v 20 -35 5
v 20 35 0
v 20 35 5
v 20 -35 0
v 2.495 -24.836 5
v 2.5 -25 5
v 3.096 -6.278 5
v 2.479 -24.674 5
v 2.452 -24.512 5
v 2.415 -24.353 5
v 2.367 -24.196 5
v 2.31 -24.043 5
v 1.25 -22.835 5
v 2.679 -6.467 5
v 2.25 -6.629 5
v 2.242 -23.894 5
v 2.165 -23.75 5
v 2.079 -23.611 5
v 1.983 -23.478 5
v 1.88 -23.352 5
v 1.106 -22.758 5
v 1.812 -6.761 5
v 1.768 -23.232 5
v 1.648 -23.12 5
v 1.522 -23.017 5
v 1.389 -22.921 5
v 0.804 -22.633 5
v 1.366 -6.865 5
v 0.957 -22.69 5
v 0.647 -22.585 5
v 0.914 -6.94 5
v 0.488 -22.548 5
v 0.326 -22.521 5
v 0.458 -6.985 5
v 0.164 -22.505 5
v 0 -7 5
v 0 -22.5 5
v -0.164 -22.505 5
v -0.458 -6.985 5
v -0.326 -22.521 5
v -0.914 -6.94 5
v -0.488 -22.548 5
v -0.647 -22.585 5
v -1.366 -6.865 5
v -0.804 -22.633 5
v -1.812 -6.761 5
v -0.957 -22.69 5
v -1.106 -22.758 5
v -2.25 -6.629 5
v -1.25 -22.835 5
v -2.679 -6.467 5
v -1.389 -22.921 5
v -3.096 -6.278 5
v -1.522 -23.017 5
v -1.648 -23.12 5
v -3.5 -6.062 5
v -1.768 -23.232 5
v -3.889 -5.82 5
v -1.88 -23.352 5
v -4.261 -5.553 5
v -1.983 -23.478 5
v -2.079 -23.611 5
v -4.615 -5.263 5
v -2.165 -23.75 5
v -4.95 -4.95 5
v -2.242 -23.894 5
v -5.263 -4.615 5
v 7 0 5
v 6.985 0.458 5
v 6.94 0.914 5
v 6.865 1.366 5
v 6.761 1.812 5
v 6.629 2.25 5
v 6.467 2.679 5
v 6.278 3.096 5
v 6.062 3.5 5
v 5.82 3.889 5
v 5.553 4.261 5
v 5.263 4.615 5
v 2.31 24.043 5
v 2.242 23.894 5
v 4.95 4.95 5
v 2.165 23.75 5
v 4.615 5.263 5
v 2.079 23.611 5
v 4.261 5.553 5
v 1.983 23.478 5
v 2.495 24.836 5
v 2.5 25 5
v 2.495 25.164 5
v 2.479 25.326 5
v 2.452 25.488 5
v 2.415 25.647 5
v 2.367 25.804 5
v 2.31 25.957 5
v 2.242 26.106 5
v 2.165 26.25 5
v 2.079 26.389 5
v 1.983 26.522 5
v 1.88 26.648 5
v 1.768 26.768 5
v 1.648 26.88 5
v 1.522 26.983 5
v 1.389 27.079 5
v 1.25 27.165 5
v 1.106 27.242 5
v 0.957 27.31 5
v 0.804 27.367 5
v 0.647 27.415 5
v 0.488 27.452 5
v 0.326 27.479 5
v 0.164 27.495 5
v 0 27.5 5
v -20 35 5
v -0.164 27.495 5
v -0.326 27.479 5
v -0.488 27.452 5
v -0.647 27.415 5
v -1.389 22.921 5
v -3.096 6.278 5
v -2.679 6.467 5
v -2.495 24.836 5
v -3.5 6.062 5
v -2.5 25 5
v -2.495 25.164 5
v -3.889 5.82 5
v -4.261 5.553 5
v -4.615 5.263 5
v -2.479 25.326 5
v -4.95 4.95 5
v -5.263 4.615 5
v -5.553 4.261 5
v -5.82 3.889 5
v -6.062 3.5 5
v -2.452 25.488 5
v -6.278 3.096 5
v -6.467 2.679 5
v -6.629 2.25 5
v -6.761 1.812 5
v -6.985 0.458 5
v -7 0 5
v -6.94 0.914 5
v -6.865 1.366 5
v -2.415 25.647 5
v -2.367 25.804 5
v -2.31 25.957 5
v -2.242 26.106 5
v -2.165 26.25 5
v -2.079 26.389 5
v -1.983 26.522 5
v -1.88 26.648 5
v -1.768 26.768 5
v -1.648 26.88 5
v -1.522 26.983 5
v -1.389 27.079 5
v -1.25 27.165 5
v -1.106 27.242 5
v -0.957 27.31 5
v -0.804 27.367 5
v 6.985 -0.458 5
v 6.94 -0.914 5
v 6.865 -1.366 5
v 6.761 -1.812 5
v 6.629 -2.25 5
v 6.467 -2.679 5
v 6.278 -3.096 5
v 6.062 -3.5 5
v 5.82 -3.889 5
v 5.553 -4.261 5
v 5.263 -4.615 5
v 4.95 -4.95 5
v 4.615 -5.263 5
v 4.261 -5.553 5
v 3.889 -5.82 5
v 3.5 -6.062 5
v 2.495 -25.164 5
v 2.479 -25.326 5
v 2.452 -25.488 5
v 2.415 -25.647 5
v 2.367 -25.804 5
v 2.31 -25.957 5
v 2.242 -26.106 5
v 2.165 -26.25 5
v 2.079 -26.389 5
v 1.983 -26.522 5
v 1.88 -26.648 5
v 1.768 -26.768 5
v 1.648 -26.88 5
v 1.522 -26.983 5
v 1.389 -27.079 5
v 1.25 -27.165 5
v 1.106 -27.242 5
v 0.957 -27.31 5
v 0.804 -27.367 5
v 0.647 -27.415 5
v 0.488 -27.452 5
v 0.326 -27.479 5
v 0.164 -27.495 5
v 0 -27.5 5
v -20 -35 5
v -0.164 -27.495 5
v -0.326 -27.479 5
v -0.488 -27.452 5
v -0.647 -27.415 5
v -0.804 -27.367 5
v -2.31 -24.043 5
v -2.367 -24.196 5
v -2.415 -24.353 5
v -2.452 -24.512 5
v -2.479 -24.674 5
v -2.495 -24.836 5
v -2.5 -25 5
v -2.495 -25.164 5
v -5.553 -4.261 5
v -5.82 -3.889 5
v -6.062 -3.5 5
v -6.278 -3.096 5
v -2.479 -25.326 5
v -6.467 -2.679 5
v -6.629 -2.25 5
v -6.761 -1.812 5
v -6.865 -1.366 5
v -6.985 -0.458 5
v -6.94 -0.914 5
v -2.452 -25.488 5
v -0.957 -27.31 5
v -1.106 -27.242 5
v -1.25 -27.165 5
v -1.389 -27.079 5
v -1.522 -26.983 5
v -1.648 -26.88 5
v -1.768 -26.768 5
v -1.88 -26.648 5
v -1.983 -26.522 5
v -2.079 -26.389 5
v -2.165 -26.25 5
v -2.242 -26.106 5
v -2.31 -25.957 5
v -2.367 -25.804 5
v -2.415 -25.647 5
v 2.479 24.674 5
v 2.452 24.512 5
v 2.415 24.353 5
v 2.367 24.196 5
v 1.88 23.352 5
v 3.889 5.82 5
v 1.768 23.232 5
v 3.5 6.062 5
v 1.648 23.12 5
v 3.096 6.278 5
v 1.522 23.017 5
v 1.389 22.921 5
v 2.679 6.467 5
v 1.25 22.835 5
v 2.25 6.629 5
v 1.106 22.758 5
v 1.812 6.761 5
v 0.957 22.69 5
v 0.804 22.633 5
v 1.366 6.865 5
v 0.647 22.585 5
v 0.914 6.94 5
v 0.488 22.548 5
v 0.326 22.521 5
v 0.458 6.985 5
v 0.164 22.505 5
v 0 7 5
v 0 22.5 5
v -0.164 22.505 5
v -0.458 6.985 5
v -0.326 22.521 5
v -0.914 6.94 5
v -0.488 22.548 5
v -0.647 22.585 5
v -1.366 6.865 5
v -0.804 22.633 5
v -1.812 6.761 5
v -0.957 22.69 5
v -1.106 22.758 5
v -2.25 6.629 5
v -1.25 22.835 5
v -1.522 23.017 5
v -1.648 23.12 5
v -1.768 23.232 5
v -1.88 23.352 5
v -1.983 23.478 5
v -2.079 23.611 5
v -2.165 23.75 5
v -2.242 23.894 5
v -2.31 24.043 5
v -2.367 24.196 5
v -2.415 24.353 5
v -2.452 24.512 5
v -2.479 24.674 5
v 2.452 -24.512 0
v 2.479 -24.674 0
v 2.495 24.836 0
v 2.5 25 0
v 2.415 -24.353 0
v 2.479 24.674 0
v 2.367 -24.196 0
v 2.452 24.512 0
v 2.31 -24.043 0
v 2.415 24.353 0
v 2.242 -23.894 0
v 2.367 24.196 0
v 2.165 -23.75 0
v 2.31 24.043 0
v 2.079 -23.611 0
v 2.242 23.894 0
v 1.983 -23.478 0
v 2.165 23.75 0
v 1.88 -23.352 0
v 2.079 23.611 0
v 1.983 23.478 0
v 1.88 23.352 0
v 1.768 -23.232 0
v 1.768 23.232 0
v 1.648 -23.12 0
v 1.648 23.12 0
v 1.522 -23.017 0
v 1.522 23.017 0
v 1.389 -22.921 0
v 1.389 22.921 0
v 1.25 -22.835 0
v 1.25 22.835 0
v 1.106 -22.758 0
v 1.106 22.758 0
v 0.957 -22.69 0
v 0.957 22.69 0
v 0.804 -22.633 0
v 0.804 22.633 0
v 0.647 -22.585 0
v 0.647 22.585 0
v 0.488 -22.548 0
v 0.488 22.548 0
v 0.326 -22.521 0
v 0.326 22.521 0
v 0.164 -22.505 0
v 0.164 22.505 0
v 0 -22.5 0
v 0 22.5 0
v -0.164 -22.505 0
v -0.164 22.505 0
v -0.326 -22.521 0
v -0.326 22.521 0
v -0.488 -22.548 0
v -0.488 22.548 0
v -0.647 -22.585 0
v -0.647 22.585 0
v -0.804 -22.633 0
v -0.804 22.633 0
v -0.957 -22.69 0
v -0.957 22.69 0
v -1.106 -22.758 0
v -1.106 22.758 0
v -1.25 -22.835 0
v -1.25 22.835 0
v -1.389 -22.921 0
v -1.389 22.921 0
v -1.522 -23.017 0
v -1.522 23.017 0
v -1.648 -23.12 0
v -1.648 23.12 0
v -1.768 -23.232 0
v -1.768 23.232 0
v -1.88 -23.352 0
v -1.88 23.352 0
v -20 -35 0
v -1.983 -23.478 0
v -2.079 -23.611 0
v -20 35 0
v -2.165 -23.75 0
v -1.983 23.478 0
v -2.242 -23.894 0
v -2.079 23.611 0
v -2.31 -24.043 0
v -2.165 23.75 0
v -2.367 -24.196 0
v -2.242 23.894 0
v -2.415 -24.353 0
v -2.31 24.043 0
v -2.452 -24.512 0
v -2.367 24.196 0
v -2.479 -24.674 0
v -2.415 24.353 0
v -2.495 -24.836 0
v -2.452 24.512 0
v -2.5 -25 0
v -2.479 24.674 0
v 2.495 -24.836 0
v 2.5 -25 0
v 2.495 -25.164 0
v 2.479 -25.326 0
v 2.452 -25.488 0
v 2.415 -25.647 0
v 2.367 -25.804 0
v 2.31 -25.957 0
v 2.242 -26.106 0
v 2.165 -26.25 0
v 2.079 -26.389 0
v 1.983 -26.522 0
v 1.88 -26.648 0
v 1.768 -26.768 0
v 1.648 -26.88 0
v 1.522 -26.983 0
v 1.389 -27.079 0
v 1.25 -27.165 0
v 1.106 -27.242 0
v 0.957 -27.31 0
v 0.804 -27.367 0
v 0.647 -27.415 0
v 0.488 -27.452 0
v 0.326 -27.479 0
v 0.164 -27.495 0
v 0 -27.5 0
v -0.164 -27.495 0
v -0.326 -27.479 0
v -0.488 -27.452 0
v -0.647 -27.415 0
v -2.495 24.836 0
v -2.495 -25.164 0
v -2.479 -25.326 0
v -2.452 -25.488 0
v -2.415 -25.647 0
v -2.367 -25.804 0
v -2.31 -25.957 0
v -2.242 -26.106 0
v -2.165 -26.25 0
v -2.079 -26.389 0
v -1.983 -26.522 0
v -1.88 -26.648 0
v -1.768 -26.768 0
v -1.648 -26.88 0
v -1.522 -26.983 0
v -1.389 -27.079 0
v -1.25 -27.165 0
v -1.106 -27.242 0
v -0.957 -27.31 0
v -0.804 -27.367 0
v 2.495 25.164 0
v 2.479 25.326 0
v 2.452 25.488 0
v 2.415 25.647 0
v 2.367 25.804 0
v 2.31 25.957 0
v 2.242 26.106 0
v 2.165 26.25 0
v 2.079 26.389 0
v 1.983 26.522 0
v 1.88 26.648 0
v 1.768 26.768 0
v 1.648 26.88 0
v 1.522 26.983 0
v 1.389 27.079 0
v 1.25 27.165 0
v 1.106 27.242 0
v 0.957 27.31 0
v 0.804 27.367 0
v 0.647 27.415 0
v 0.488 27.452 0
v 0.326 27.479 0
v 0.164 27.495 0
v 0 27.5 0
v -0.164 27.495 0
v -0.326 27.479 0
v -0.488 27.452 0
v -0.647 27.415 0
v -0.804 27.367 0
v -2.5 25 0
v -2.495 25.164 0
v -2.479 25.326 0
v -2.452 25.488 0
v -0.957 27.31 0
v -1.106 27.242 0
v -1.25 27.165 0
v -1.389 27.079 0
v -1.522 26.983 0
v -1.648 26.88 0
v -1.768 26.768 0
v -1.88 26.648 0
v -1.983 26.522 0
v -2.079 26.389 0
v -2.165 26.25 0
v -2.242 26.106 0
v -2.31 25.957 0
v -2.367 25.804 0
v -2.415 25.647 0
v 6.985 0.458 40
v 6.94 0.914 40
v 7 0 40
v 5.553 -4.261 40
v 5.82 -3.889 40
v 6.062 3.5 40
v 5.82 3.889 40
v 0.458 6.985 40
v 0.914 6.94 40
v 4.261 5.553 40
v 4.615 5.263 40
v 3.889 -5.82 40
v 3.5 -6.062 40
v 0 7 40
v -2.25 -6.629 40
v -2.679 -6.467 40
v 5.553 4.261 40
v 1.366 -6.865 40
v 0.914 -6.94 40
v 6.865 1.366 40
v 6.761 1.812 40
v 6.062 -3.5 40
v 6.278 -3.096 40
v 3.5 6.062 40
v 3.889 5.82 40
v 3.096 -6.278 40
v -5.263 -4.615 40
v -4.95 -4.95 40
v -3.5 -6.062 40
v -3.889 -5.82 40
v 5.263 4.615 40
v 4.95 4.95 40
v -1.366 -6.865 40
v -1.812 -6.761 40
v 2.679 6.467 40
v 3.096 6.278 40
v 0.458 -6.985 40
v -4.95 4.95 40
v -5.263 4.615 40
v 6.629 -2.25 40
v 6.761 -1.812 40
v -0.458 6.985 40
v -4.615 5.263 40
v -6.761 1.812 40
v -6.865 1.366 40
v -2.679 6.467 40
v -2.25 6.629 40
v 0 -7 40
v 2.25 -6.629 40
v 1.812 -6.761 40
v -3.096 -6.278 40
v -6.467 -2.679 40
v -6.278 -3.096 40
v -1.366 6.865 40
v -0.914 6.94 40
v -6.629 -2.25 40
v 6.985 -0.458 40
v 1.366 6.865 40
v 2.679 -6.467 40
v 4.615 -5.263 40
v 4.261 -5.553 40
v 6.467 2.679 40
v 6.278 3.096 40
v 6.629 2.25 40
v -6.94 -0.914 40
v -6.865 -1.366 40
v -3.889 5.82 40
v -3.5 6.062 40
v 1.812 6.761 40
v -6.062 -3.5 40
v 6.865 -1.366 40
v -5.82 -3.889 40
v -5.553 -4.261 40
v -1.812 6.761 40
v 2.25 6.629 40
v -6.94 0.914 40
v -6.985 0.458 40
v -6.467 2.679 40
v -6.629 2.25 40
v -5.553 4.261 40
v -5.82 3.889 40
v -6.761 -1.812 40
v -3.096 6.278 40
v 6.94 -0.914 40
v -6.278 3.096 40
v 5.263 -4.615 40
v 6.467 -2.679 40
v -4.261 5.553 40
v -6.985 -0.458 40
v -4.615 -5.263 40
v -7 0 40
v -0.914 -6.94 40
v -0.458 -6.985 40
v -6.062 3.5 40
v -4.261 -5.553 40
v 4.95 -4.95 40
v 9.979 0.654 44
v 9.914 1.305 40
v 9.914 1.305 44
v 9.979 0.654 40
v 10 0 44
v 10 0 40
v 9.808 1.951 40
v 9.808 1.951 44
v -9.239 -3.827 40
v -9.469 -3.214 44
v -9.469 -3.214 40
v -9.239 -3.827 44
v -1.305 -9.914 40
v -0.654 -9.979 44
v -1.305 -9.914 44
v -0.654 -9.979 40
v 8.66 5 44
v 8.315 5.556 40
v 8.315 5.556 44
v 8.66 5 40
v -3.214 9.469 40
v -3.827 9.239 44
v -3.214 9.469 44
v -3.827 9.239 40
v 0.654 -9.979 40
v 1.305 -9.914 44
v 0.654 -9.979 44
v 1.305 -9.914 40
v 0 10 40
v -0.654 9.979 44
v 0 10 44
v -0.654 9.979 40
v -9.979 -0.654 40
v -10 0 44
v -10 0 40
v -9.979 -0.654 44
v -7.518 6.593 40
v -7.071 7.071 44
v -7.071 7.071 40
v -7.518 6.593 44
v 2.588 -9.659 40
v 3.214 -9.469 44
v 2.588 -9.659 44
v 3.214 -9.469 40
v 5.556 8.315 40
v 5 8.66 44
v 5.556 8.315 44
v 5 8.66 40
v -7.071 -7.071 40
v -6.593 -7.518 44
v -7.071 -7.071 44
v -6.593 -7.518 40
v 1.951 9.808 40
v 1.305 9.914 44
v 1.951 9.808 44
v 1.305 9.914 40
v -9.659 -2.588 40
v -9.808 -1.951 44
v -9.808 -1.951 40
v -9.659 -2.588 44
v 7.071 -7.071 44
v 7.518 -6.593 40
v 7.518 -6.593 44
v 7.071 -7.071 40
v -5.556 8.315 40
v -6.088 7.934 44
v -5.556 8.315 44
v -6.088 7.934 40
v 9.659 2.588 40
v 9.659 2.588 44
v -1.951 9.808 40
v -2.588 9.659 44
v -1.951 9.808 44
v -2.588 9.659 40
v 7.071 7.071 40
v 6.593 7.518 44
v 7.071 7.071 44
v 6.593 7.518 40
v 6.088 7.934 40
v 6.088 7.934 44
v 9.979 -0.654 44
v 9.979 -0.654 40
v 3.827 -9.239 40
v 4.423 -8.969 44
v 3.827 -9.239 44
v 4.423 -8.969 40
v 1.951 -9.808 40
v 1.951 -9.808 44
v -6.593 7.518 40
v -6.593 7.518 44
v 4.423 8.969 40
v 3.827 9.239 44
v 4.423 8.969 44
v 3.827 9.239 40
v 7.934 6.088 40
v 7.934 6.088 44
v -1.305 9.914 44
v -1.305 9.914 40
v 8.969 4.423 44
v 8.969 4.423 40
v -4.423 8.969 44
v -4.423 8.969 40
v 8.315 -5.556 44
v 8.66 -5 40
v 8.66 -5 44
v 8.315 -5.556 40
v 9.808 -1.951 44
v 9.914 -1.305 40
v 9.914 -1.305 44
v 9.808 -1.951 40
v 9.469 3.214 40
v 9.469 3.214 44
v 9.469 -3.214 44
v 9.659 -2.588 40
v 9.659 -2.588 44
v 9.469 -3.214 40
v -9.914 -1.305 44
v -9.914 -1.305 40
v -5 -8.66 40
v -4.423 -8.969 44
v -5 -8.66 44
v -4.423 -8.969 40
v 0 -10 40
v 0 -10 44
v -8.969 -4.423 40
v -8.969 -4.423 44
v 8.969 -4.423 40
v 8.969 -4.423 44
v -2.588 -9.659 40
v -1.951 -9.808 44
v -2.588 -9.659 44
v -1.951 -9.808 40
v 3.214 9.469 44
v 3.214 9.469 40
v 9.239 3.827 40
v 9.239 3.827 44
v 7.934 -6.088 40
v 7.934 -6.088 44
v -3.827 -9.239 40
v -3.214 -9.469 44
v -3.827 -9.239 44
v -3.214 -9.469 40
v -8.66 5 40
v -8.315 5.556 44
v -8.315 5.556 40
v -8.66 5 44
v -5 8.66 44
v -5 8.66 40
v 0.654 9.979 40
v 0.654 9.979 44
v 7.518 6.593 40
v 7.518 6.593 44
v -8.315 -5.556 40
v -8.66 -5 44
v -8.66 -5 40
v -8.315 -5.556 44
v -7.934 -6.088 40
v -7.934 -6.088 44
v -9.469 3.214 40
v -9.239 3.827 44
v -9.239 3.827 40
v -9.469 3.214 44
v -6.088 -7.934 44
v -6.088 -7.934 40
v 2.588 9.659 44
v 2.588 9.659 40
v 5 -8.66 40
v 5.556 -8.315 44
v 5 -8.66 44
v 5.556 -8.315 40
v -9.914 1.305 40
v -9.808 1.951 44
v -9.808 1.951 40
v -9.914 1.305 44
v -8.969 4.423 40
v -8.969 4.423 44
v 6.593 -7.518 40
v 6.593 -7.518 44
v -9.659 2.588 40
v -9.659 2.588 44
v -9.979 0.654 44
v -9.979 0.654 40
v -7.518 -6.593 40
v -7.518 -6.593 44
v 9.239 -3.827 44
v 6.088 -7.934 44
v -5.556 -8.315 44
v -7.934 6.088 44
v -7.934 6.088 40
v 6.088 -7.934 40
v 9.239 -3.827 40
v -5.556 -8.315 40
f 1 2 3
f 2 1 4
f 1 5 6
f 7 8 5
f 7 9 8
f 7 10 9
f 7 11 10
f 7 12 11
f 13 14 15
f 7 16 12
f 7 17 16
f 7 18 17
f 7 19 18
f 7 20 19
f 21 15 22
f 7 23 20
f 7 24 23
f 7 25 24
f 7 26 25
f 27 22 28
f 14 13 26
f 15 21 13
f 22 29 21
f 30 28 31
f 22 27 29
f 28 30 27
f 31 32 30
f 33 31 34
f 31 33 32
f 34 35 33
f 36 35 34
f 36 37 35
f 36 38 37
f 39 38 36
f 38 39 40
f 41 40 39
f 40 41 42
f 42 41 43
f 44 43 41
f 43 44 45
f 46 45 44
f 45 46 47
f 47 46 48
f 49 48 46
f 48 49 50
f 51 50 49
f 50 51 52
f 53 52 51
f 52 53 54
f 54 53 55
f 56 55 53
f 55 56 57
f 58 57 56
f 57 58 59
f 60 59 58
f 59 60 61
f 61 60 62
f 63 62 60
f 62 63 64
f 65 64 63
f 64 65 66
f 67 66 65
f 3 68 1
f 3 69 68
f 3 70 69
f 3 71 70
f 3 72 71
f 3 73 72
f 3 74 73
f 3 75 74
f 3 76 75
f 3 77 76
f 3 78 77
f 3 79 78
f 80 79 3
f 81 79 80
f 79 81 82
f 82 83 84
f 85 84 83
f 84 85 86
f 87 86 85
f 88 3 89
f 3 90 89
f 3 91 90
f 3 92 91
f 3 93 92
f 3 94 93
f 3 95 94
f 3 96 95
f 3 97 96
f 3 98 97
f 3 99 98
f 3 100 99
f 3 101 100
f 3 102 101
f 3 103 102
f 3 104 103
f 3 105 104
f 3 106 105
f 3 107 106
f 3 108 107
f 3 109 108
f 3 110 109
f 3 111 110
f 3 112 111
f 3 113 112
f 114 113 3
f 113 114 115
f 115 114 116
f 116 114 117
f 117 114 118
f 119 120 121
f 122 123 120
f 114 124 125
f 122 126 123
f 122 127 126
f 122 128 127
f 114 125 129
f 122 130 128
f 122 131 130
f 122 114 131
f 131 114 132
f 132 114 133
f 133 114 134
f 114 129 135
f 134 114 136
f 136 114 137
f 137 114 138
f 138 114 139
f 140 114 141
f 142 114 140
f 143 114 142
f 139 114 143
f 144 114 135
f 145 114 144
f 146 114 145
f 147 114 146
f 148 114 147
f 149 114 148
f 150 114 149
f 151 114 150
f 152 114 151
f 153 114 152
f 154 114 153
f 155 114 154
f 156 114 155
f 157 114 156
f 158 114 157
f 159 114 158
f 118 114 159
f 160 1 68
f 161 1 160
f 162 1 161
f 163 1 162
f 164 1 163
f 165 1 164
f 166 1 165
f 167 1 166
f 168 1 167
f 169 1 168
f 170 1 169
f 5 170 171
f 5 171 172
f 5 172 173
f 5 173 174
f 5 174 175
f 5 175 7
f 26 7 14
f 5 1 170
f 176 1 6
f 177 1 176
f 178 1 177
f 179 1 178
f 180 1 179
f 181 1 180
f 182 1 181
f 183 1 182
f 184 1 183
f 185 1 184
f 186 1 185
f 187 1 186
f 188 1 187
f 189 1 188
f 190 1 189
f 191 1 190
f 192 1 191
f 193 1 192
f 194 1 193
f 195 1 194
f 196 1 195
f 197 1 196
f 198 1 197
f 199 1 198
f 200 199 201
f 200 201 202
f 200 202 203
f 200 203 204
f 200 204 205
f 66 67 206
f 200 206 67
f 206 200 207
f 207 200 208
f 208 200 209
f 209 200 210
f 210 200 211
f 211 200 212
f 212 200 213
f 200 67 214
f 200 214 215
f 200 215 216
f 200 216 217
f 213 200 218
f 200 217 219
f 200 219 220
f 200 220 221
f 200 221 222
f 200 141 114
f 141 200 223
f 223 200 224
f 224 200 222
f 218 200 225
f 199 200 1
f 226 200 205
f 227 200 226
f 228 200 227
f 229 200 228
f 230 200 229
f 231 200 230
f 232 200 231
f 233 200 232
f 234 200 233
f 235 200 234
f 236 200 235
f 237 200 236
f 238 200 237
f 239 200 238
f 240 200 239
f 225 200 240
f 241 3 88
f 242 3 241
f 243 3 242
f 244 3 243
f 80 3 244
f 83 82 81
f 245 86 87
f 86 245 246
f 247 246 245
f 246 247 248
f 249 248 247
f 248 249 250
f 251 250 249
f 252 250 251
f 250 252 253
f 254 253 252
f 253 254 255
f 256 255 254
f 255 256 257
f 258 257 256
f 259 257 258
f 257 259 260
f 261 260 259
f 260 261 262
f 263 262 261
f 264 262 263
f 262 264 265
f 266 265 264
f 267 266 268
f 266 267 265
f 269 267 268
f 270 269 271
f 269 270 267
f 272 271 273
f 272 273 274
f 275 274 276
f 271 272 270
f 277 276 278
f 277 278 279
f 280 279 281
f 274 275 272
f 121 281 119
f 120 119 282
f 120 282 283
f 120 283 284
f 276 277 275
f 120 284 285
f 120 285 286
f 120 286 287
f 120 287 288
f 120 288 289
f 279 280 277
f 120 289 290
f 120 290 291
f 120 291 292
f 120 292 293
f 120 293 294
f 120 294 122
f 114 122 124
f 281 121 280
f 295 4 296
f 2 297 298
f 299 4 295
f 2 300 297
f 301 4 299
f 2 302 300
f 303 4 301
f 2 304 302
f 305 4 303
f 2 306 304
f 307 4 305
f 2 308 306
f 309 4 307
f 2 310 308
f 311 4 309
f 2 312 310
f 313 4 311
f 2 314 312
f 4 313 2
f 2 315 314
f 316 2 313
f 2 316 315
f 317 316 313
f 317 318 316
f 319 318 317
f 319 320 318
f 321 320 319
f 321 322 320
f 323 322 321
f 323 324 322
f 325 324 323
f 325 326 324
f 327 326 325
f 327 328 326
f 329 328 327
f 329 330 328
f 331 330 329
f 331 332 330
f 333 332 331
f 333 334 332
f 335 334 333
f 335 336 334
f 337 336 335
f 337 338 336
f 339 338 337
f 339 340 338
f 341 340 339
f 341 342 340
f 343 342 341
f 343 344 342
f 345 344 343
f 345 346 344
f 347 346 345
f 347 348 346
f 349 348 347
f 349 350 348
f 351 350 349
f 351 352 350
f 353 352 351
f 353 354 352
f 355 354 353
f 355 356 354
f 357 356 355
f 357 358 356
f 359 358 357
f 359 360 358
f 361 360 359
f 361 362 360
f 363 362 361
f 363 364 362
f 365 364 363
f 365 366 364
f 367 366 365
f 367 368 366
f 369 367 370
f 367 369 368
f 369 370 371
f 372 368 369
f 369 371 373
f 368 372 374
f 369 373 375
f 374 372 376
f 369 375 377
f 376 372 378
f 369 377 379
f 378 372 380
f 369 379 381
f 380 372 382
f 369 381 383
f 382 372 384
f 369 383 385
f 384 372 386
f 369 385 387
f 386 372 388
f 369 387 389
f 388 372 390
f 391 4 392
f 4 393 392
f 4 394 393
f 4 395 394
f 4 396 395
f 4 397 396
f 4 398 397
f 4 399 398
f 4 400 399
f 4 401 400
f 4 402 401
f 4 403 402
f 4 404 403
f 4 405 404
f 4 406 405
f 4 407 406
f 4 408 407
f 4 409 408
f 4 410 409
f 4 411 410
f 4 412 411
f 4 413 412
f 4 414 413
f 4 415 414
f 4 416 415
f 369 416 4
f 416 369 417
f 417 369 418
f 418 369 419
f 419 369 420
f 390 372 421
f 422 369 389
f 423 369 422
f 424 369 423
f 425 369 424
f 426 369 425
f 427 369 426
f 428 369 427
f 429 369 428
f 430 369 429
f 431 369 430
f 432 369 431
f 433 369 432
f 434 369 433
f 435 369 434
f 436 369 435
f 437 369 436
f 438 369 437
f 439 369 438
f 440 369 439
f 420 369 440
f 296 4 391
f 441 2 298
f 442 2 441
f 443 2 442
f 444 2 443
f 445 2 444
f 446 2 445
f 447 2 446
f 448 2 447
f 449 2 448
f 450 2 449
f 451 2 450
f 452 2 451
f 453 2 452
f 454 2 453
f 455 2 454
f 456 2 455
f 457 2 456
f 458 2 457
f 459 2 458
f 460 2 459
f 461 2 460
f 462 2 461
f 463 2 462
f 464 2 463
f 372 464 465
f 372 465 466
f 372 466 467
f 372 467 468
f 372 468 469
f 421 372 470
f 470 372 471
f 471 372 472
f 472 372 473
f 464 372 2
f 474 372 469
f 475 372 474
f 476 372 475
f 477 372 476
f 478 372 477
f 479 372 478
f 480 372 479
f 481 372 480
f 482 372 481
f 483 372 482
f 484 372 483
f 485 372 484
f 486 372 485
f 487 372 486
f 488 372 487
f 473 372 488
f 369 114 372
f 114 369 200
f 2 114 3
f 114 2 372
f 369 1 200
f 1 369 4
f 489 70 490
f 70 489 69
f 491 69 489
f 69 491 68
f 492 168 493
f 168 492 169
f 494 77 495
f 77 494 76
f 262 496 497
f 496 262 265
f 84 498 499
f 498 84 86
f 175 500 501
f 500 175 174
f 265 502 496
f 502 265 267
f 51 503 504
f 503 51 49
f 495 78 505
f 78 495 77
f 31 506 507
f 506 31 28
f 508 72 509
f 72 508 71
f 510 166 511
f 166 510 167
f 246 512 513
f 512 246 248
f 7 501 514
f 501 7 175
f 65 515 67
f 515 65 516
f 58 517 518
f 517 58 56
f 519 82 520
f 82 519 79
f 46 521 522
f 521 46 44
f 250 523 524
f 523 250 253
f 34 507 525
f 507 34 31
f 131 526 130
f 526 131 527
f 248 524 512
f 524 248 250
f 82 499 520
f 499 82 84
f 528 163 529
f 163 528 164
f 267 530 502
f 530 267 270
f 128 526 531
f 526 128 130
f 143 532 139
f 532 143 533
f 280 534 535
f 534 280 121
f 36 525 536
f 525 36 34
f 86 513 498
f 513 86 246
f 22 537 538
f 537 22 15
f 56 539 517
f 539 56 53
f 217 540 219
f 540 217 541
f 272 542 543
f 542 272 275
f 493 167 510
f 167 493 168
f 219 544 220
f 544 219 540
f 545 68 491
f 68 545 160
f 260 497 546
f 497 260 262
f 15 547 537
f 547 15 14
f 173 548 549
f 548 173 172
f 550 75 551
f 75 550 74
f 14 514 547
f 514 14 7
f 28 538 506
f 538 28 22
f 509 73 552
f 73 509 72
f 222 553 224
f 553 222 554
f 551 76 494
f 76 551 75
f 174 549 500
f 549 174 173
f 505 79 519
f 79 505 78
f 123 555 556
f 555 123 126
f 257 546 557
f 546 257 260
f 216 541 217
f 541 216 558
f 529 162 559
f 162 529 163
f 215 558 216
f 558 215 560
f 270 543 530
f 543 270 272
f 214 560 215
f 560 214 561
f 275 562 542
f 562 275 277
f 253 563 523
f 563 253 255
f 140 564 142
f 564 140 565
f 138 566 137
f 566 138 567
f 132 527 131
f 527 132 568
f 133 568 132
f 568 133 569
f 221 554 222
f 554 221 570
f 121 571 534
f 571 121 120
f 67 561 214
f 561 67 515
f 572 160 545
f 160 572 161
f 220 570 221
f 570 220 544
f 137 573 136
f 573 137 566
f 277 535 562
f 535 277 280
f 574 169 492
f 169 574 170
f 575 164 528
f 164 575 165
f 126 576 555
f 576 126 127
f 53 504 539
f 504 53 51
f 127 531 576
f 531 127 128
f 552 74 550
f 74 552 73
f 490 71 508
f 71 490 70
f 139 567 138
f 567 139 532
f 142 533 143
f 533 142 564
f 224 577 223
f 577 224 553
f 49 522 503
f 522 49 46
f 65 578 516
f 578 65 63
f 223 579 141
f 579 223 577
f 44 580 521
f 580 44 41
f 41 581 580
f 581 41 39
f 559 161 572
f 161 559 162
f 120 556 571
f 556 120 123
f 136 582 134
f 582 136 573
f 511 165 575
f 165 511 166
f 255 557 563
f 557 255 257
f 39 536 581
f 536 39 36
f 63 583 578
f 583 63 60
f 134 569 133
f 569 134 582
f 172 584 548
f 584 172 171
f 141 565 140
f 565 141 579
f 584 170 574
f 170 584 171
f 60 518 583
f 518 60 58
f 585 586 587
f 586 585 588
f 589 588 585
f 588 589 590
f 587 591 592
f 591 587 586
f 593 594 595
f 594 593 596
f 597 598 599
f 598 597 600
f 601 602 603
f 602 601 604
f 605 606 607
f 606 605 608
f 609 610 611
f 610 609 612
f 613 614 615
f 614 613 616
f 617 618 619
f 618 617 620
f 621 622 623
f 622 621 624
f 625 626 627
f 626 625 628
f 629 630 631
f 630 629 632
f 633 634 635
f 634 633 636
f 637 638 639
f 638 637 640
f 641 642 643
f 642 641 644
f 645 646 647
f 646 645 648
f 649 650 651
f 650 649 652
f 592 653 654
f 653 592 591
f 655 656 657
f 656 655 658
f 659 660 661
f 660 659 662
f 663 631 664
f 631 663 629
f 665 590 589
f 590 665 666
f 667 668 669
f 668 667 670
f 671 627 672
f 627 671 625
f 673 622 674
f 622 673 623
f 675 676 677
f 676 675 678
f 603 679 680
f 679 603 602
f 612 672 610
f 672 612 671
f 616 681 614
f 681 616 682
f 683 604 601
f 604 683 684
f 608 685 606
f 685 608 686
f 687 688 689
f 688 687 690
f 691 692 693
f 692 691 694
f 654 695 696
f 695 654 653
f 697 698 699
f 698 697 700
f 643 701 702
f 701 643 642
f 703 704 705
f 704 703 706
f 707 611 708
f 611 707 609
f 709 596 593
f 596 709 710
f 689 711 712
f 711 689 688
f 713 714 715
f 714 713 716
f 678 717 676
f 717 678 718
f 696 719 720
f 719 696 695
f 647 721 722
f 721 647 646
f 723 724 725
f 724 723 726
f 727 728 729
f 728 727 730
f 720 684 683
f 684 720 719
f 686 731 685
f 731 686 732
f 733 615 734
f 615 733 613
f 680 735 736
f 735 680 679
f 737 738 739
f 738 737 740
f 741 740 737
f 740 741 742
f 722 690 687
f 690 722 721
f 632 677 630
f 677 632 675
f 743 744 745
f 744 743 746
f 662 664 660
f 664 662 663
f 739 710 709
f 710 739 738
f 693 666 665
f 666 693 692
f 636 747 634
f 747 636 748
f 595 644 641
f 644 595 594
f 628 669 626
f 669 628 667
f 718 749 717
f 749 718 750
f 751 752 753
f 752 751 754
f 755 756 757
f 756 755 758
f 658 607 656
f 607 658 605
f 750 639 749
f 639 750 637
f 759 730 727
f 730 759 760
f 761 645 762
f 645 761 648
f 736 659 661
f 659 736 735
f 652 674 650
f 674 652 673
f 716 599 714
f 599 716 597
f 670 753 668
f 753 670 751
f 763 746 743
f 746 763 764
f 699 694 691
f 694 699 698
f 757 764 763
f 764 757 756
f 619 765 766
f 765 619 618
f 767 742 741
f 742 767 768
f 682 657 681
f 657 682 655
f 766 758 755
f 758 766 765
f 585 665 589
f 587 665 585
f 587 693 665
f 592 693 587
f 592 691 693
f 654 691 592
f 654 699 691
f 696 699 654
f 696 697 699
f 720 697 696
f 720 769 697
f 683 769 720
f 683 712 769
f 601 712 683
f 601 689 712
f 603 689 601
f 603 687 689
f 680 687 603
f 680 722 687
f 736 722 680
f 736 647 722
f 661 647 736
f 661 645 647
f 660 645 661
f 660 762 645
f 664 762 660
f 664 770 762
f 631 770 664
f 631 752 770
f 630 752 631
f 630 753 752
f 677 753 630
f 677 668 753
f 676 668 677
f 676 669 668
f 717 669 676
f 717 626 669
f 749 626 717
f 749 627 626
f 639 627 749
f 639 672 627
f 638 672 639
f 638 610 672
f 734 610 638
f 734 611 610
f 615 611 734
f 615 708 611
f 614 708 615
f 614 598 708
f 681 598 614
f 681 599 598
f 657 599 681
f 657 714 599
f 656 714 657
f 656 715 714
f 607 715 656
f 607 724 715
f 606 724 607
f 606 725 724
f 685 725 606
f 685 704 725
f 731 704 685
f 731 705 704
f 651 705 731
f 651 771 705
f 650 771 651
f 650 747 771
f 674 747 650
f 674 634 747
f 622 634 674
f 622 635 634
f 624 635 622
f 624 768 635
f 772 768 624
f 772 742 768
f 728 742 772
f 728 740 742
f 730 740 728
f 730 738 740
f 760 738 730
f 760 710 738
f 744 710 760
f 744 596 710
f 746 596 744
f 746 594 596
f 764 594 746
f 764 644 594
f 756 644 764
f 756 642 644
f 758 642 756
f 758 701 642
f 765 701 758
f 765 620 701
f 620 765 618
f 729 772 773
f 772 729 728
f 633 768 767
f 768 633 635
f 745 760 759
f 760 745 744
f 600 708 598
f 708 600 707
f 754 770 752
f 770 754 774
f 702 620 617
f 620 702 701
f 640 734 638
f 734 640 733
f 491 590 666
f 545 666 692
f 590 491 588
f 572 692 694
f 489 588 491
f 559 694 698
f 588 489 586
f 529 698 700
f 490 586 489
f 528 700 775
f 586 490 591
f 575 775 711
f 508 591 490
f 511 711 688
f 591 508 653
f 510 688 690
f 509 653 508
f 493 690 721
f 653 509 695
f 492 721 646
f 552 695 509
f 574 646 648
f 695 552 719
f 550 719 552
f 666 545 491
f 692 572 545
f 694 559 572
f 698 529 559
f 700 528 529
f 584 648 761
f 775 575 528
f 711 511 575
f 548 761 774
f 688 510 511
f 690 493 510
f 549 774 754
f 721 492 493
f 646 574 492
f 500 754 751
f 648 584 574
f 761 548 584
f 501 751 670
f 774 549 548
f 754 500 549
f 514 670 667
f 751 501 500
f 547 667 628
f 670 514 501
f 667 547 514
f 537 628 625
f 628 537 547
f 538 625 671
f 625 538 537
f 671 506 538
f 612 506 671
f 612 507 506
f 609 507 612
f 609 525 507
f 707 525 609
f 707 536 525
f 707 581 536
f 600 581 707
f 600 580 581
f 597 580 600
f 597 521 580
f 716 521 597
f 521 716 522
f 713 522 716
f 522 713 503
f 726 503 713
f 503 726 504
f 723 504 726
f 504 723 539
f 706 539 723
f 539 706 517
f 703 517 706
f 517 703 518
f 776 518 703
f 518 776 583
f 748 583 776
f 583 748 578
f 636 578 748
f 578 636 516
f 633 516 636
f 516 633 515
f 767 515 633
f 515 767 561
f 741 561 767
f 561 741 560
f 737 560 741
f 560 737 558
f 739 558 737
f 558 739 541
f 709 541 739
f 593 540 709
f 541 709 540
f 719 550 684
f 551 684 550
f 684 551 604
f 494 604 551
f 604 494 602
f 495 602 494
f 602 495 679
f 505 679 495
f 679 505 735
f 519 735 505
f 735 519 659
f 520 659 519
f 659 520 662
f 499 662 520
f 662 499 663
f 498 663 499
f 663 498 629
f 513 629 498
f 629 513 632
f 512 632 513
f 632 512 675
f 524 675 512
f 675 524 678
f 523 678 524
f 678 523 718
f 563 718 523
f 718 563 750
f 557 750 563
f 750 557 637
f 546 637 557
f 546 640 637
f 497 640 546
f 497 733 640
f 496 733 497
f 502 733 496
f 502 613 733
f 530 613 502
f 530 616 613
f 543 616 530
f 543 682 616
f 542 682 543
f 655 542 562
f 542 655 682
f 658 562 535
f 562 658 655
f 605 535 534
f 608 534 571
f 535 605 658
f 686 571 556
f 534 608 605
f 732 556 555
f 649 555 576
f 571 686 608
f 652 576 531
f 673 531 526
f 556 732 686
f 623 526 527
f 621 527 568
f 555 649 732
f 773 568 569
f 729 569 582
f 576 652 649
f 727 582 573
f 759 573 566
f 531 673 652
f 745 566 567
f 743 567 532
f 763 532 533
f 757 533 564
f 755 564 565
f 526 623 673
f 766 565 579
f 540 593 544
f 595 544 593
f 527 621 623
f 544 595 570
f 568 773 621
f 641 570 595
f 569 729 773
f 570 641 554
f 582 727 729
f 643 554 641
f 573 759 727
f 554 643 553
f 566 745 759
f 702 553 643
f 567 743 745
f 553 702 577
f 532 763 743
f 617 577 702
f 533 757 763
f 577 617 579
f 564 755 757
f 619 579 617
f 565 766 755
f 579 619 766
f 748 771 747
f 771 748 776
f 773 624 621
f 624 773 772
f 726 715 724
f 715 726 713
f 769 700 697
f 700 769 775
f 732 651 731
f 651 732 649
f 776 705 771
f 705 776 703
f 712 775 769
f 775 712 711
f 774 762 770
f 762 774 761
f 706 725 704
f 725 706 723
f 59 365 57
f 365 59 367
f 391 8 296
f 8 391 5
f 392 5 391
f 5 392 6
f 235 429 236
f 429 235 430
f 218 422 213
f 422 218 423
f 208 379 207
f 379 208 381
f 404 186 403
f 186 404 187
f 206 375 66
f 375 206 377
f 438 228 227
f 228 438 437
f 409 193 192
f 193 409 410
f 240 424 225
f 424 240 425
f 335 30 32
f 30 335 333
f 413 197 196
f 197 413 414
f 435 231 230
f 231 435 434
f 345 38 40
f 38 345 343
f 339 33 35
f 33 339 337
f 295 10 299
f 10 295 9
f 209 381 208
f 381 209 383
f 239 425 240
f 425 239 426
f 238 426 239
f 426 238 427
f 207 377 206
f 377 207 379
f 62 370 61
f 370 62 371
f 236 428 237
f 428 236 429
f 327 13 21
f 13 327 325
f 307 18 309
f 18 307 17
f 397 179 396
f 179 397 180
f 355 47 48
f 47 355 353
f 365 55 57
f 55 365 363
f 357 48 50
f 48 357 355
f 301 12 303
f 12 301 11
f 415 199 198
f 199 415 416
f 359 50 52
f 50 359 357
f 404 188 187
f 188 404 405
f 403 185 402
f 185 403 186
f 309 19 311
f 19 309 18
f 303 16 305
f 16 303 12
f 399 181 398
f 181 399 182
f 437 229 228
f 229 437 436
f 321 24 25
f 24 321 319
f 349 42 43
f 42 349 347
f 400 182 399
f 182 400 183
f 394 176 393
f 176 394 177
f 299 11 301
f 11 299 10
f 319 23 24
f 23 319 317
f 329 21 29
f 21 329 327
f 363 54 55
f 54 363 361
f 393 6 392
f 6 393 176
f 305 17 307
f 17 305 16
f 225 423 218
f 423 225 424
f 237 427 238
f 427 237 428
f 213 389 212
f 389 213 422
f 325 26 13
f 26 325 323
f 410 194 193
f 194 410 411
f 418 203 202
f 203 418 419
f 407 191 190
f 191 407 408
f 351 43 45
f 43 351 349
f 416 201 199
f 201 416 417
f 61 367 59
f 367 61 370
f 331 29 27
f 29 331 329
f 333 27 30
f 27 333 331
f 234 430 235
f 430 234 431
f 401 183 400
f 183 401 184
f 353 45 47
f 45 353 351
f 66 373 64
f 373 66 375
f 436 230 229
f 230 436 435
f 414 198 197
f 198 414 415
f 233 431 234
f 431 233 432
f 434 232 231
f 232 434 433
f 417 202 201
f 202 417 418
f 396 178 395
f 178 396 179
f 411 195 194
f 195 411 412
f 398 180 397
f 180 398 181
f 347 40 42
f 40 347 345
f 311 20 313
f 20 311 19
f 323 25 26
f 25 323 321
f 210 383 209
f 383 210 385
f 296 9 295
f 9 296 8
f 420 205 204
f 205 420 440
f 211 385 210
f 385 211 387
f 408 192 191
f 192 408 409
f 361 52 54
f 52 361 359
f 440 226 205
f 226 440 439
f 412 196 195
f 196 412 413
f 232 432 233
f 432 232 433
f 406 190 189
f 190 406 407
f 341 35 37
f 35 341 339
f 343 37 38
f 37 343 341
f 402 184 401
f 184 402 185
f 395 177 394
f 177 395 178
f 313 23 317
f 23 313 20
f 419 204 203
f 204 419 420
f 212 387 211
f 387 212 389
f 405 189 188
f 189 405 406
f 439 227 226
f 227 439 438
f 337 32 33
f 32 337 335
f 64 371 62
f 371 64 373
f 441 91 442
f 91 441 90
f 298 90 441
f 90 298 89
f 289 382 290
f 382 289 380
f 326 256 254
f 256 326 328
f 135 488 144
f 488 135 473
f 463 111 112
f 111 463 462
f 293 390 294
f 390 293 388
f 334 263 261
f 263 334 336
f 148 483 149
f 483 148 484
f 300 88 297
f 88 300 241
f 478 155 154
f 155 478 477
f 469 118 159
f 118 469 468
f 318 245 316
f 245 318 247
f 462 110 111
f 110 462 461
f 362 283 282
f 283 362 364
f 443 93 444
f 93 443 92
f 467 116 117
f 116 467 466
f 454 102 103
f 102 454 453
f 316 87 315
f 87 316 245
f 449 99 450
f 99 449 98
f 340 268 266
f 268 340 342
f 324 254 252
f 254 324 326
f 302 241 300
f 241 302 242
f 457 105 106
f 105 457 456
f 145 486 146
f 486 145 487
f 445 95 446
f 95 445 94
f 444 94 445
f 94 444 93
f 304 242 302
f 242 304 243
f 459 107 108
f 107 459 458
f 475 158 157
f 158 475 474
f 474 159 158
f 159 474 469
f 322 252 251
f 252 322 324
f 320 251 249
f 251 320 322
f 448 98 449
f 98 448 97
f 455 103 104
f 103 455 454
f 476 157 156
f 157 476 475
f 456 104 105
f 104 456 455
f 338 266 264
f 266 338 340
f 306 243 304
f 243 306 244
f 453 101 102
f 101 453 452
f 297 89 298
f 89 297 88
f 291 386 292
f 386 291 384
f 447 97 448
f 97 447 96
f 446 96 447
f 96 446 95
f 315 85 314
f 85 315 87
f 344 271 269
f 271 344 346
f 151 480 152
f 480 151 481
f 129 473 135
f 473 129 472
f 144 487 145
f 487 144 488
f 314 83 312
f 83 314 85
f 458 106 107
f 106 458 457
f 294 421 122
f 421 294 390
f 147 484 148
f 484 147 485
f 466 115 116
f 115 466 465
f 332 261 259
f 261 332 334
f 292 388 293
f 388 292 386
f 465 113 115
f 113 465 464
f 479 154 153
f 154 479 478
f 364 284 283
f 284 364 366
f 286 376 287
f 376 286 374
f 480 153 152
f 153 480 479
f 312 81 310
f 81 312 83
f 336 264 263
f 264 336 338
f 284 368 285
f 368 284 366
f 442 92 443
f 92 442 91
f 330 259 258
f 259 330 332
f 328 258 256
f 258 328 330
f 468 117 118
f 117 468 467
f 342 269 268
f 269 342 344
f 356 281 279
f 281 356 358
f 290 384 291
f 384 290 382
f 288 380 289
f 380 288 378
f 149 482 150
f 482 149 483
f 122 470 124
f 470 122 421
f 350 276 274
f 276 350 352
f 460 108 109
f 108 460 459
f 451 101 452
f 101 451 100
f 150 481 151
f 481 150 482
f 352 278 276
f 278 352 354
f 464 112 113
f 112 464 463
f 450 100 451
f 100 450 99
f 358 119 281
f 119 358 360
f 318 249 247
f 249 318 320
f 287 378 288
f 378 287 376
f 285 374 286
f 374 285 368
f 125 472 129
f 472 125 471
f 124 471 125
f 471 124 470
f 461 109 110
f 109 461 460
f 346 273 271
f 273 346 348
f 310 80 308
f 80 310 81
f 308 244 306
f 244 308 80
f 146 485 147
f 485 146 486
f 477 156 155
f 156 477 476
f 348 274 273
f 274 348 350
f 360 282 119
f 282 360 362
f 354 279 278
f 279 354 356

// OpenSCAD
plate_width = 40; plate_height = 70; plate_thickness = 5; hole_diameter = 5; hole_y = 25;
peg_diameter = 14; peg_length = 35; stop_diameter = 20; stop_thickness = 4;
$fn = 96;
difference() {
  union() {
    translate([-plate_width/2, -plate_height/2, 0]) cube([plate_width, plate_height, plate_thickness]);
    translate([0, 0, plate_thickness - 0.5]) cylinder(d = peg_diameter, h = peg_length + 1);
    translate([0, 0, plate_thickness + peg_length]) cylinder(d = stop_diameter, h = stop_thickness);
  }
  for (y = [-hole_y, hole_y])
    translate([0, y, -1]) cylinder(d = hole_diameter, h = plate_thickness + 2);
}
